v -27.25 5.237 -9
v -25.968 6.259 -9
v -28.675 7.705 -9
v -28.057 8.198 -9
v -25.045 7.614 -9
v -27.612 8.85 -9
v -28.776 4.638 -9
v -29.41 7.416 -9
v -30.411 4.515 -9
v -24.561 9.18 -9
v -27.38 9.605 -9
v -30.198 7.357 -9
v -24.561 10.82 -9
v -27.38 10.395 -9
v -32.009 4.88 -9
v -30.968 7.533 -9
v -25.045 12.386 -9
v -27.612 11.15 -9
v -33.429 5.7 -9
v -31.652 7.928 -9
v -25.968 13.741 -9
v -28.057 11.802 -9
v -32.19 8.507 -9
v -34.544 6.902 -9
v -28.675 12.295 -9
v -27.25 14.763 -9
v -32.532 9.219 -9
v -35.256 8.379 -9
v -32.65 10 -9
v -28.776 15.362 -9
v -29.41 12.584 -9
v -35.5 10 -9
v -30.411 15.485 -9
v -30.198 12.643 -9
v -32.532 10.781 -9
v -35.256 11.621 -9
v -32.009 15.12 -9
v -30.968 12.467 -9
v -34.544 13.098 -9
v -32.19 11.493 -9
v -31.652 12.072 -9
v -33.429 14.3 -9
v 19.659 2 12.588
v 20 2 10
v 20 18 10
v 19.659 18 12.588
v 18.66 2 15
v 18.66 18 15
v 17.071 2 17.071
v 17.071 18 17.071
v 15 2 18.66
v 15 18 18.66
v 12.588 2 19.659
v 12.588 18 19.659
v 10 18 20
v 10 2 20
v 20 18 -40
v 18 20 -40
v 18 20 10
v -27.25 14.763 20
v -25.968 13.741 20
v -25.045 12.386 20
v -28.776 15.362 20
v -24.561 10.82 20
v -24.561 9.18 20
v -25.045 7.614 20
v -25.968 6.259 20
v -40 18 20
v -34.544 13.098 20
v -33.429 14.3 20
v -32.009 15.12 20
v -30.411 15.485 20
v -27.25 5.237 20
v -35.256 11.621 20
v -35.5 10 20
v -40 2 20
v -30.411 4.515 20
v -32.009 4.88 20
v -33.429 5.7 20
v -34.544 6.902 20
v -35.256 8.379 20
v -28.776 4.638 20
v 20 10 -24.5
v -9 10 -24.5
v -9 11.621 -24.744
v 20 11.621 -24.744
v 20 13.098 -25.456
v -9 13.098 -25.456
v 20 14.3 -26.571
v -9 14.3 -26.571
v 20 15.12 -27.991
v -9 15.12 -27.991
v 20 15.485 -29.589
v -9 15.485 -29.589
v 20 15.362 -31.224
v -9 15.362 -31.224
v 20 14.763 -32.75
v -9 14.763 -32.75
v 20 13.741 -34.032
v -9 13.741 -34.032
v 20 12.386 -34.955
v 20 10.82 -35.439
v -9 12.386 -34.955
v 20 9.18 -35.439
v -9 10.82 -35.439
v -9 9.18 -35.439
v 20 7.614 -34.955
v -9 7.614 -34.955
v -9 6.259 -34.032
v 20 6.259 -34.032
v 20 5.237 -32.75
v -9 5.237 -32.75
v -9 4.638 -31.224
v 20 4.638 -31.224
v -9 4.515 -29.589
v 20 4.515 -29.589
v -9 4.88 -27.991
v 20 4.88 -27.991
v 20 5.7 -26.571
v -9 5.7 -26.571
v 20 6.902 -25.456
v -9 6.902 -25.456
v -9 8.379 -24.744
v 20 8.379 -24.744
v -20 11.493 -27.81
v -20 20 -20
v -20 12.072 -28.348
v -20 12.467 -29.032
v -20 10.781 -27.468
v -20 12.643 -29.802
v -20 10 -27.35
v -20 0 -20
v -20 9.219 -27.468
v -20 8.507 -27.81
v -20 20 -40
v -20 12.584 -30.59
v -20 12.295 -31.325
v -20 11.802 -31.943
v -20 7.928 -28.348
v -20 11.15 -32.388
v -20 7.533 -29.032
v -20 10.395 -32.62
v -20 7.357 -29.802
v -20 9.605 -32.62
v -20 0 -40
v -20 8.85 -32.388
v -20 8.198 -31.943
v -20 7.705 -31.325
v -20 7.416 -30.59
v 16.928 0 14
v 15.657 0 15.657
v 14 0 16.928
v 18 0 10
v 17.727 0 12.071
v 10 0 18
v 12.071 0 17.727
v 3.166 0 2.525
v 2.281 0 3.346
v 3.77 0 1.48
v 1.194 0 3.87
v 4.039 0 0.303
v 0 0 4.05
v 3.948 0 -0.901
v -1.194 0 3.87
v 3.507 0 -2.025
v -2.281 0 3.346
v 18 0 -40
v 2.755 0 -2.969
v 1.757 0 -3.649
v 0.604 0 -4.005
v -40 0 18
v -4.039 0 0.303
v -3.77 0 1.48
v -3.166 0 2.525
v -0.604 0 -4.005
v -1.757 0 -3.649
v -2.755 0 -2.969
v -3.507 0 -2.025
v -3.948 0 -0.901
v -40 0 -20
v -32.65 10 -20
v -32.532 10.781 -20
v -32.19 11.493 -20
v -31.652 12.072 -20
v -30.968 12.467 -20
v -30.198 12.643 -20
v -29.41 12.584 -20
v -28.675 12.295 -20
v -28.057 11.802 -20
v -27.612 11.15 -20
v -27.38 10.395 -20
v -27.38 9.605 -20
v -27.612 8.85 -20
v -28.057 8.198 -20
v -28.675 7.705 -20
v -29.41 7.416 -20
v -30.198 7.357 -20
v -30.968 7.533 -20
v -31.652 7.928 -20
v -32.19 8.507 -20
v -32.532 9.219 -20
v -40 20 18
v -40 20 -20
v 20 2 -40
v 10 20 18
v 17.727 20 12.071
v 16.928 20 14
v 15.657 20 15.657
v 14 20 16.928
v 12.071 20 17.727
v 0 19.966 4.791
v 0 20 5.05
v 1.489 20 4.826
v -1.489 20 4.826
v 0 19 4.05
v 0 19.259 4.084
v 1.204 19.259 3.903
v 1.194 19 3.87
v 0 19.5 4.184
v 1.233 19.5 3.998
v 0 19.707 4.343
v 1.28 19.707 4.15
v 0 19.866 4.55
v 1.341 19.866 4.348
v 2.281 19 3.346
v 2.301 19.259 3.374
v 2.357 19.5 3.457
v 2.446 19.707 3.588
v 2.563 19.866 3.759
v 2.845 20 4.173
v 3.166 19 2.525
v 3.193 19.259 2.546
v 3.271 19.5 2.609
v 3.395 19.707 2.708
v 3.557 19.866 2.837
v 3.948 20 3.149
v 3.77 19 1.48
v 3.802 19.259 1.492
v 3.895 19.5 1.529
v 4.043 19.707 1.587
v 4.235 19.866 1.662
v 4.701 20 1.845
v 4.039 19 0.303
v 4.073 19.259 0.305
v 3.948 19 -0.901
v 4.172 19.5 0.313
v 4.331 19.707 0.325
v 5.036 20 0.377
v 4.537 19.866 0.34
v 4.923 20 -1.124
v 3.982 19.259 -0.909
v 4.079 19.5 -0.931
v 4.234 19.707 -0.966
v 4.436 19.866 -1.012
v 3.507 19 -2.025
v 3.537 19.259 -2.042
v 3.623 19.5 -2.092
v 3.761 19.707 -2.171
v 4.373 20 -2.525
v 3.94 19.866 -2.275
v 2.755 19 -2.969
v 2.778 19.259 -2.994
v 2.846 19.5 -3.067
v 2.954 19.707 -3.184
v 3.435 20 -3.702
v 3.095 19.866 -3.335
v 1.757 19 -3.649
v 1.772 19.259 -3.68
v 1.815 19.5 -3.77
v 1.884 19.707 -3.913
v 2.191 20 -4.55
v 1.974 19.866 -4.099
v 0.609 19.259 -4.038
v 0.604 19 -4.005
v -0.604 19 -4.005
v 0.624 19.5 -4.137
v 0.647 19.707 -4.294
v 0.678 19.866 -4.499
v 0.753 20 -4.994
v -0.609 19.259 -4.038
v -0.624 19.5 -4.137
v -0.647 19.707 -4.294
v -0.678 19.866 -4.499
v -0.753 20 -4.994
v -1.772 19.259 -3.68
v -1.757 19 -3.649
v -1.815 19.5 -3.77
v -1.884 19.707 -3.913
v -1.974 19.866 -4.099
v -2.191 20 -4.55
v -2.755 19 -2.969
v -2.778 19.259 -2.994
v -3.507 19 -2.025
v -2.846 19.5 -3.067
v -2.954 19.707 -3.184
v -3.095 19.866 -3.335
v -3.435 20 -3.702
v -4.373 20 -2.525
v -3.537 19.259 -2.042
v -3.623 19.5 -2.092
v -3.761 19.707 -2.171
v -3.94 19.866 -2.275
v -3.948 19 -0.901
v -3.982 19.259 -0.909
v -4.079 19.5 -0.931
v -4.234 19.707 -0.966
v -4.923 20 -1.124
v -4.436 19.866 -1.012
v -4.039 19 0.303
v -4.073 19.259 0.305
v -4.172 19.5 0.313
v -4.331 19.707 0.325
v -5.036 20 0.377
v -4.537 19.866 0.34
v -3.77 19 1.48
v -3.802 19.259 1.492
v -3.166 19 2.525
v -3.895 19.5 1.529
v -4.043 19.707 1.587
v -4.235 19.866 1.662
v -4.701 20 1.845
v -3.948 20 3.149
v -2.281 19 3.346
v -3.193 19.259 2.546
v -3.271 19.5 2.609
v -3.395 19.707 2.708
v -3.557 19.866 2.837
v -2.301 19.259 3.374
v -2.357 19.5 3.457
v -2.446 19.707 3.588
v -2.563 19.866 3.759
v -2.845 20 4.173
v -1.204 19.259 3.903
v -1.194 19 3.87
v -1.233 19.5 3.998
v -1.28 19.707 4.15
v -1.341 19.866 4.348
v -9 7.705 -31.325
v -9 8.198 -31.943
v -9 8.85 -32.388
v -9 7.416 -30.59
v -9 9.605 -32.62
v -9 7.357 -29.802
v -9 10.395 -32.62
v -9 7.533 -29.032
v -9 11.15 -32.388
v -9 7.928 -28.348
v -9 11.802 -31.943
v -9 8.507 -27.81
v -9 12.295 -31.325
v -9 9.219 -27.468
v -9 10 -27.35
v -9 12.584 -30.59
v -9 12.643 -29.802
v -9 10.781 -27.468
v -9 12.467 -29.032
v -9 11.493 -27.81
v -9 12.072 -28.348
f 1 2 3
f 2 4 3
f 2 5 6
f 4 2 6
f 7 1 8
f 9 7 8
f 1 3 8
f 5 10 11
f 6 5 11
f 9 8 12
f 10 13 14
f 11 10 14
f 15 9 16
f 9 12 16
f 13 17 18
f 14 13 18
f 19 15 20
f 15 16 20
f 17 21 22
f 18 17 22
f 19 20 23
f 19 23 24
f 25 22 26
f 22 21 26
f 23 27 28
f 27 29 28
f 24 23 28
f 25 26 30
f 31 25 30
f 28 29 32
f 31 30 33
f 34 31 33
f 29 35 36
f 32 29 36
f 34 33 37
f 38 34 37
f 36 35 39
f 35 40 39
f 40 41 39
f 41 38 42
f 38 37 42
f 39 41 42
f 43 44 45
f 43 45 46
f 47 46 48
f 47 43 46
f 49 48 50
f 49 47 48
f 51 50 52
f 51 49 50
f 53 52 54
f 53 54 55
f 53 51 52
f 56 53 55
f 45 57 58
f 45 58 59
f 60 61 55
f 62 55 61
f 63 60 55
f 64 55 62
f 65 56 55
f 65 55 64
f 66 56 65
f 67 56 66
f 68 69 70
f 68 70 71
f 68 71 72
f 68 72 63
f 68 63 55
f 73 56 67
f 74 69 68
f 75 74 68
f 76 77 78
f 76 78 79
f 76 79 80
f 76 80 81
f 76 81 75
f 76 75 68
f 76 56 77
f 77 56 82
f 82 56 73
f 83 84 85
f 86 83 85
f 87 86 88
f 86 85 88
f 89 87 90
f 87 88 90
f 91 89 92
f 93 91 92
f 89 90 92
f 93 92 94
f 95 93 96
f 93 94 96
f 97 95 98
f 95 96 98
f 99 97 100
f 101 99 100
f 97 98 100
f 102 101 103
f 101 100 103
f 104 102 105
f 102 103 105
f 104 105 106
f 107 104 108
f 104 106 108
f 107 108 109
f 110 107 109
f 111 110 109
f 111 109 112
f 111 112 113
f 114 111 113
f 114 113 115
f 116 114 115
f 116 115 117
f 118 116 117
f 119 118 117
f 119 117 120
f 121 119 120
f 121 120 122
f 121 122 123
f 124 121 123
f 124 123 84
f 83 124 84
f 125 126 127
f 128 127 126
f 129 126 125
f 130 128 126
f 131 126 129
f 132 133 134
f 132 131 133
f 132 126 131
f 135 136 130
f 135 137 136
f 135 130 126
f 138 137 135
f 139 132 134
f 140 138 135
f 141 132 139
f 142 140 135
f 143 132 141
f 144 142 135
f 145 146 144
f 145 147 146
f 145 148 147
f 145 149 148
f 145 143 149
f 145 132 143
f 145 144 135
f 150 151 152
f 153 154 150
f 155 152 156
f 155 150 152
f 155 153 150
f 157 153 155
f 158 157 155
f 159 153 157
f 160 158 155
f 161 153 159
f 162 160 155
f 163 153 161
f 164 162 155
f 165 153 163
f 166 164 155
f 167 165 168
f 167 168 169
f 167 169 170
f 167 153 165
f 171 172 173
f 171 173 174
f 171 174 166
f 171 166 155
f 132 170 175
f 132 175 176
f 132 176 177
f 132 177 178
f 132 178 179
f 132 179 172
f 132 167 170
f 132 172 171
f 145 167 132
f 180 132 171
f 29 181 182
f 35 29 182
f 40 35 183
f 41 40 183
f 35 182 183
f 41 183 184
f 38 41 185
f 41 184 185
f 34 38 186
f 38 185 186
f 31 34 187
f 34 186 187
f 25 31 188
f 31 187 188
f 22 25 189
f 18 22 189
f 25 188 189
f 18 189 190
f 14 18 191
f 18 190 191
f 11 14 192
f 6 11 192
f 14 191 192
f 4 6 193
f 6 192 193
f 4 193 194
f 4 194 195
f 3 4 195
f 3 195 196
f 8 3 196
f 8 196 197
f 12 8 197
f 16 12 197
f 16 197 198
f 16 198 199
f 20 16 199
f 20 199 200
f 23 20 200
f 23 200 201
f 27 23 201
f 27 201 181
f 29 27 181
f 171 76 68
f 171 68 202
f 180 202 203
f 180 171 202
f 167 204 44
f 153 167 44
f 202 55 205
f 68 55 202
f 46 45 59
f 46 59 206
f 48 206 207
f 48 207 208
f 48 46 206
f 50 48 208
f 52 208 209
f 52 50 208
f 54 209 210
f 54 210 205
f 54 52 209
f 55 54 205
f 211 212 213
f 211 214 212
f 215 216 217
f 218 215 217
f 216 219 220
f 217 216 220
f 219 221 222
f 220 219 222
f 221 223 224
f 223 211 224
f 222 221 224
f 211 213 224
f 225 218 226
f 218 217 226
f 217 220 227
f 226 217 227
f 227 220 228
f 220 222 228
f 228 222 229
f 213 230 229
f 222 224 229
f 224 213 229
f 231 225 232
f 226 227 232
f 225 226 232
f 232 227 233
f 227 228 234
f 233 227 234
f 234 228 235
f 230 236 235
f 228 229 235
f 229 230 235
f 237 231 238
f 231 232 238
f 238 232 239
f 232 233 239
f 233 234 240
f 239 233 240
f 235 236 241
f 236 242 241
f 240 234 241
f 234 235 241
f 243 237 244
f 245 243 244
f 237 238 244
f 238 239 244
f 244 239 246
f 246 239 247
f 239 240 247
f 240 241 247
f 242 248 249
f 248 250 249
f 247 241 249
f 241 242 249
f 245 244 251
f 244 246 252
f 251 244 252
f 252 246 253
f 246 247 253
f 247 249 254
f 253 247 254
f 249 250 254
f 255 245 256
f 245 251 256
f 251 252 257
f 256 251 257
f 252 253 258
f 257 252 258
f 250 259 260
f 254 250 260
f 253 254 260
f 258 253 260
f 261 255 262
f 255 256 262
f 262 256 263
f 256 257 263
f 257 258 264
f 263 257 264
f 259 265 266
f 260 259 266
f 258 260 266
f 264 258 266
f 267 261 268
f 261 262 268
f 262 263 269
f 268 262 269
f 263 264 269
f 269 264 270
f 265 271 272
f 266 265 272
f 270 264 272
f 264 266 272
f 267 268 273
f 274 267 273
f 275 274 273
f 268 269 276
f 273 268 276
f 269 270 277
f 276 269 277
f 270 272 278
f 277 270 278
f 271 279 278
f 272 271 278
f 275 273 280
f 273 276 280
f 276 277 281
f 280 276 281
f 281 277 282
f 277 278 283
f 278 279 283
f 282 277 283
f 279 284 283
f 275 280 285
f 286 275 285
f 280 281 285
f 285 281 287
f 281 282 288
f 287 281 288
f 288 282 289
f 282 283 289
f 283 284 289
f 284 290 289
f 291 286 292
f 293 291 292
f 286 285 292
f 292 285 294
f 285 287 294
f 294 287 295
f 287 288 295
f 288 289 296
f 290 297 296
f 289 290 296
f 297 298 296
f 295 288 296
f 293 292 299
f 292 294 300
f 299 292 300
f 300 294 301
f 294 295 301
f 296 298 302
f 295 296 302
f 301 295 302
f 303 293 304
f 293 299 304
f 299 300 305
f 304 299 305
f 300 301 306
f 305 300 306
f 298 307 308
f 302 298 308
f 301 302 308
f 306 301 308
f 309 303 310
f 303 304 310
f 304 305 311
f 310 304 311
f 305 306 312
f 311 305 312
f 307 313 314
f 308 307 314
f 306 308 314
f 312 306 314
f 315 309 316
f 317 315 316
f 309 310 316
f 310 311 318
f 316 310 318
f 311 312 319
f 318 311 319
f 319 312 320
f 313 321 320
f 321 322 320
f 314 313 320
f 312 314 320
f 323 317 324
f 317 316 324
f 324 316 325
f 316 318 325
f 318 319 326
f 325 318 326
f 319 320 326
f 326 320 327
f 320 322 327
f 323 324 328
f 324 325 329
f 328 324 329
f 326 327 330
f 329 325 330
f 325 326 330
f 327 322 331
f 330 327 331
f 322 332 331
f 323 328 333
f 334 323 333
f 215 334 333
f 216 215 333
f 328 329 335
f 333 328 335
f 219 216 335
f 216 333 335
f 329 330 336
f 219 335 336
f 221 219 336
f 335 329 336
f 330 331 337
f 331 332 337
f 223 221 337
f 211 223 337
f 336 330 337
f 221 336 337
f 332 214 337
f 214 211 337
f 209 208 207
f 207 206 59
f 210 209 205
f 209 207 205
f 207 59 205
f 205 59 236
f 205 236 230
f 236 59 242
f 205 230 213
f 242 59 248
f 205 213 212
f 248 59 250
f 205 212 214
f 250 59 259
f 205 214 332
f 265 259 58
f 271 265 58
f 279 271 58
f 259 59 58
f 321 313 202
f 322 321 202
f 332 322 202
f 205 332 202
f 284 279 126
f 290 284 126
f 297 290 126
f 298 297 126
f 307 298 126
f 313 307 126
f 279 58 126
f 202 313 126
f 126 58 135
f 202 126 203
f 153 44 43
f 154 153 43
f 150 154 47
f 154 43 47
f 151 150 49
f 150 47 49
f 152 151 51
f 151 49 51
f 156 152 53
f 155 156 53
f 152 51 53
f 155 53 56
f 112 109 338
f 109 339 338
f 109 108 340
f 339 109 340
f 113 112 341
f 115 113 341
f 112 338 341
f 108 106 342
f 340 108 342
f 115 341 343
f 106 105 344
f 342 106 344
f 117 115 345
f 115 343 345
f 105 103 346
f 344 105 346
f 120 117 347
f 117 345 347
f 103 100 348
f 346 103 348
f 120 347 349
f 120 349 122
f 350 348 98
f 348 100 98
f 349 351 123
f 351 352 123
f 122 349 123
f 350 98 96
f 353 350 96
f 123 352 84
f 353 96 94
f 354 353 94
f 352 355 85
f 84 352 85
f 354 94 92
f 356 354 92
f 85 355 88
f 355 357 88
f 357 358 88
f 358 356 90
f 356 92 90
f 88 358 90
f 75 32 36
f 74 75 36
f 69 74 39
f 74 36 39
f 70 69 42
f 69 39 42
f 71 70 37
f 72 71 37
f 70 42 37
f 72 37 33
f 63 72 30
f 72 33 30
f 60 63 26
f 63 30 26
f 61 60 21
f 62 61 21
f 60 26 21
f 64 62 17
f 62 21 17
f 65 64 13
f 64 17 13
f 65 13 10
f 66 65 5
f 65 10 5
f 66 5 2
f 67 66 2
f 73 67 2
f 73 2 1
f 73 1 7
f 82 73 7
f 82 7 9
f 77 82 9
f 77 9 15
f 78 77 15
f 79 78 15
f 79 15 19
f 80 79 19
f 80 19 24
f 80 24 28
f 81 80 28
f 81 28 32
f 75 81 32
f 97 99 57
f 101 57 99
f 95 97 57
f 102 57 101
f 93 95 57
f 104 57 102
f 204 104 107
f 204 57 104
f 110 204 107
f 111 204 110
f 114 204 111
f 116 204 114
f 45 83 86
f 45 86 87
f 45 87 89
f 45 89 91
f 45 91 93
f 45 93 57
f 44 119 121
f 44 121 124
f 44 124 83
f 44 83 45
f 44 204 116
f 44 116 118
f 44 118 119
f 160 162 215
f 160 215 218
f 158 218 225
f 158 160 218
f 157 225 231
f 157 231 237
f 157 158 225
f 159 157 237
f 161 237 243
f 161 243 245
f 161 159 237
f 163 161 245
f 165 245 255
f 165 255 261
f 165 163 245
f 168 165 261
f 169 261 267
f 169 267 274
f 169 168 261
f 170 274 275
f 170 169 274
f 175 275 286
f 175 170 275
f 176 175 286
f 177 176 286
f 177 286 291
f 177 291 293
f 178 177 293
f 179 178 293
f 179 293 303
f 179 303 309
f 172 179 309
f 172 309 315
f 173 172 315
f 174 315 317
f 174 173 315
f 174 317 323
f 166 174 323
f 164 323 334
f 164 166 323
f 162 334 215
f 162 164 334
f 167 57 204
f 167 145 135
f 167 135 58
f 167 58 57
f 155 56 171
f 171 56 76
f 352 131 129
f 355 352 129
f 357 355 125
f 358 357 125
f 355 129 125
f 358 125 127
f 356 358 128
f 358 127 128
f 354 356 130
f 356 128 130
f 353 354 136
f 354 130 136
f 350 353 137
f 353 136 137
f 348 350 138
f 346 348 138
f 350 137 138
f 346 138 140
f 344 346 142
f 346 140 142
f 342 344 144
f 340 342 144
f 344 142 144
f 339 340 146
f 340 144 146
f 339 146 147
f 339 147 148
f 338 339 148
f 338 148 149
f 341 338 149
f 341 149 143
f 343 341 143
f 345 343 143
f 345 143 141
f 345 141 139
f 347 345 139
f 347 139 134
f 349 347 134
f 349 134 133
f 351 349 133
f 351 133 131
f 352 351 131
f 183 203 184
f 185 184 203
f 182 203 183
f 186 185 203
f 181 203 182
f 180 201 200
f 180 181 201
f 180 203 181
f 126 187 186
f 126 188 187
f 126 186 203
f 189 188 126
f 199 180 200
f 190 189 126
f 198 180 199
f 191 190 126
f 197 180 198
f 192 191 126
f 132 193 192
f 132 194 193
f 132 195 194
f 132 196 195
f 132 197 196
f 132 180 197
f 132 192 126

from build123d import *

# Parameters (mm, degrees)
SKETCH1_R           = 4.05
BOSS_EXTRUDE1_DEPTH = 20
FILLET1_R           = 1
CHAMFER2_SIZE       = 2
SKETCH7_R           = 2.65
CUT_EXTRUDE8_DEPTH  = 40
SKETCH8_R           = 2.65
CUT_EXTRUDE9_DEPTH  = 40
SKETCH9_R           = 5.5
CUT_EXTRUDE10_DEPTH = 40
SKETCH10_R          = 5.5
CUT_EXTRUDE11_DEPTH = 40


with BuildPart() as part:
    # Sketch1 → Boss-Extrude1 (new body)
    with BuildSketch(Plane(origin=(0, 0, 0), x_dir=(1, 0, 0), z_dir=(0, 1, 0))):
        with BuildLine():
            Line((-20, 40), (20, 40))
            Line((20, 40), (20, -10))
            ThreePointArc((20, -10), (17.071067812, -17.071067812), (10, -20))
            Line((10, -20), (-40, -20))
            Line((-40, -20), (-40, 20))
            Line((-40, 20), (-20, 20))
            Line((-20, 20), (-20, 40))
        make_face()
        with Locations(Location((0, 0, 0), (0, 0, 270))):
            Circle(SKETCH1_R, mode=Mode.SUBTRACT)
    extrude(amount=BOSS_EXTRUDE1_DEPTH)

    # Fillet1
    fillet1_edges = [part.edges().sort_by_distance(p)[0] for p in [
        (0, 20, -4.05),
    ]]
    fillet(fillet1_edges, radius=FILLET1_R)

    # Chamfer2
    chamfer2_edges = [part.edges().sort_by_distance(p)[0] for p in [
        (-15, 20, 20),
        (17.071067812, 20, 17.071067812),
        (20, 20, -15),
        (20, 0, -15),
        (17.071067812, 0, 17.071067812),
        (-15, 0, 20),
    ]]
    chamfer(chamfer2_edges, length=CHAMFER2_SIZE)

    # Sketch7 → Cut-Extrude8 (cut)
    with BuildSketch(Plane.ZY.offset(20)):
        with Locations((-30, 10)):
            Circle(SKETCH7_R)
    extrude(amount=-CUT_EXTRUDE8_DEPTH, mode=Mode.SUBTRACT)

    # Sketch8 → Cut-Extrude9 (cut)
    with BuildSketch(Plane(origin=(0, 0, -20), x_dir=(-1, 0, 0), z_dir=(0, 0, -1))):
        with Locations((30, 10)):
            Circle(SKETCH8_R)
    extrude(amount=-CUT_EXTRUDE9_DEPTH, mode=Mode.SUBTRACT)

    # Sketch9 → Cut-Extrude10 (cut)
    with BuildSketch(Plane.ZY.offset(9)):
        with Locations((-30, 10)):
            Circle(SKETCH9_R)
    extrude(amount=-CUT_EXTRUDE10_DEPTH, mode=Mode.SUBTRACT)

    # Sketch10 → Cut-Extrude11 (cut)
    with BuildSketch(Plane(origin=(0, 0, -9), x_dir=(-1, 0, 0), z_dir=(0, 0, -1))):
        with Locations((30, 10)):
            Circle(SKETCH10_R)
    extrude(amount=-CUT_EXTRUDE11_DEPTH, mode=Mode.SUBTRACT)


solid = part.part
